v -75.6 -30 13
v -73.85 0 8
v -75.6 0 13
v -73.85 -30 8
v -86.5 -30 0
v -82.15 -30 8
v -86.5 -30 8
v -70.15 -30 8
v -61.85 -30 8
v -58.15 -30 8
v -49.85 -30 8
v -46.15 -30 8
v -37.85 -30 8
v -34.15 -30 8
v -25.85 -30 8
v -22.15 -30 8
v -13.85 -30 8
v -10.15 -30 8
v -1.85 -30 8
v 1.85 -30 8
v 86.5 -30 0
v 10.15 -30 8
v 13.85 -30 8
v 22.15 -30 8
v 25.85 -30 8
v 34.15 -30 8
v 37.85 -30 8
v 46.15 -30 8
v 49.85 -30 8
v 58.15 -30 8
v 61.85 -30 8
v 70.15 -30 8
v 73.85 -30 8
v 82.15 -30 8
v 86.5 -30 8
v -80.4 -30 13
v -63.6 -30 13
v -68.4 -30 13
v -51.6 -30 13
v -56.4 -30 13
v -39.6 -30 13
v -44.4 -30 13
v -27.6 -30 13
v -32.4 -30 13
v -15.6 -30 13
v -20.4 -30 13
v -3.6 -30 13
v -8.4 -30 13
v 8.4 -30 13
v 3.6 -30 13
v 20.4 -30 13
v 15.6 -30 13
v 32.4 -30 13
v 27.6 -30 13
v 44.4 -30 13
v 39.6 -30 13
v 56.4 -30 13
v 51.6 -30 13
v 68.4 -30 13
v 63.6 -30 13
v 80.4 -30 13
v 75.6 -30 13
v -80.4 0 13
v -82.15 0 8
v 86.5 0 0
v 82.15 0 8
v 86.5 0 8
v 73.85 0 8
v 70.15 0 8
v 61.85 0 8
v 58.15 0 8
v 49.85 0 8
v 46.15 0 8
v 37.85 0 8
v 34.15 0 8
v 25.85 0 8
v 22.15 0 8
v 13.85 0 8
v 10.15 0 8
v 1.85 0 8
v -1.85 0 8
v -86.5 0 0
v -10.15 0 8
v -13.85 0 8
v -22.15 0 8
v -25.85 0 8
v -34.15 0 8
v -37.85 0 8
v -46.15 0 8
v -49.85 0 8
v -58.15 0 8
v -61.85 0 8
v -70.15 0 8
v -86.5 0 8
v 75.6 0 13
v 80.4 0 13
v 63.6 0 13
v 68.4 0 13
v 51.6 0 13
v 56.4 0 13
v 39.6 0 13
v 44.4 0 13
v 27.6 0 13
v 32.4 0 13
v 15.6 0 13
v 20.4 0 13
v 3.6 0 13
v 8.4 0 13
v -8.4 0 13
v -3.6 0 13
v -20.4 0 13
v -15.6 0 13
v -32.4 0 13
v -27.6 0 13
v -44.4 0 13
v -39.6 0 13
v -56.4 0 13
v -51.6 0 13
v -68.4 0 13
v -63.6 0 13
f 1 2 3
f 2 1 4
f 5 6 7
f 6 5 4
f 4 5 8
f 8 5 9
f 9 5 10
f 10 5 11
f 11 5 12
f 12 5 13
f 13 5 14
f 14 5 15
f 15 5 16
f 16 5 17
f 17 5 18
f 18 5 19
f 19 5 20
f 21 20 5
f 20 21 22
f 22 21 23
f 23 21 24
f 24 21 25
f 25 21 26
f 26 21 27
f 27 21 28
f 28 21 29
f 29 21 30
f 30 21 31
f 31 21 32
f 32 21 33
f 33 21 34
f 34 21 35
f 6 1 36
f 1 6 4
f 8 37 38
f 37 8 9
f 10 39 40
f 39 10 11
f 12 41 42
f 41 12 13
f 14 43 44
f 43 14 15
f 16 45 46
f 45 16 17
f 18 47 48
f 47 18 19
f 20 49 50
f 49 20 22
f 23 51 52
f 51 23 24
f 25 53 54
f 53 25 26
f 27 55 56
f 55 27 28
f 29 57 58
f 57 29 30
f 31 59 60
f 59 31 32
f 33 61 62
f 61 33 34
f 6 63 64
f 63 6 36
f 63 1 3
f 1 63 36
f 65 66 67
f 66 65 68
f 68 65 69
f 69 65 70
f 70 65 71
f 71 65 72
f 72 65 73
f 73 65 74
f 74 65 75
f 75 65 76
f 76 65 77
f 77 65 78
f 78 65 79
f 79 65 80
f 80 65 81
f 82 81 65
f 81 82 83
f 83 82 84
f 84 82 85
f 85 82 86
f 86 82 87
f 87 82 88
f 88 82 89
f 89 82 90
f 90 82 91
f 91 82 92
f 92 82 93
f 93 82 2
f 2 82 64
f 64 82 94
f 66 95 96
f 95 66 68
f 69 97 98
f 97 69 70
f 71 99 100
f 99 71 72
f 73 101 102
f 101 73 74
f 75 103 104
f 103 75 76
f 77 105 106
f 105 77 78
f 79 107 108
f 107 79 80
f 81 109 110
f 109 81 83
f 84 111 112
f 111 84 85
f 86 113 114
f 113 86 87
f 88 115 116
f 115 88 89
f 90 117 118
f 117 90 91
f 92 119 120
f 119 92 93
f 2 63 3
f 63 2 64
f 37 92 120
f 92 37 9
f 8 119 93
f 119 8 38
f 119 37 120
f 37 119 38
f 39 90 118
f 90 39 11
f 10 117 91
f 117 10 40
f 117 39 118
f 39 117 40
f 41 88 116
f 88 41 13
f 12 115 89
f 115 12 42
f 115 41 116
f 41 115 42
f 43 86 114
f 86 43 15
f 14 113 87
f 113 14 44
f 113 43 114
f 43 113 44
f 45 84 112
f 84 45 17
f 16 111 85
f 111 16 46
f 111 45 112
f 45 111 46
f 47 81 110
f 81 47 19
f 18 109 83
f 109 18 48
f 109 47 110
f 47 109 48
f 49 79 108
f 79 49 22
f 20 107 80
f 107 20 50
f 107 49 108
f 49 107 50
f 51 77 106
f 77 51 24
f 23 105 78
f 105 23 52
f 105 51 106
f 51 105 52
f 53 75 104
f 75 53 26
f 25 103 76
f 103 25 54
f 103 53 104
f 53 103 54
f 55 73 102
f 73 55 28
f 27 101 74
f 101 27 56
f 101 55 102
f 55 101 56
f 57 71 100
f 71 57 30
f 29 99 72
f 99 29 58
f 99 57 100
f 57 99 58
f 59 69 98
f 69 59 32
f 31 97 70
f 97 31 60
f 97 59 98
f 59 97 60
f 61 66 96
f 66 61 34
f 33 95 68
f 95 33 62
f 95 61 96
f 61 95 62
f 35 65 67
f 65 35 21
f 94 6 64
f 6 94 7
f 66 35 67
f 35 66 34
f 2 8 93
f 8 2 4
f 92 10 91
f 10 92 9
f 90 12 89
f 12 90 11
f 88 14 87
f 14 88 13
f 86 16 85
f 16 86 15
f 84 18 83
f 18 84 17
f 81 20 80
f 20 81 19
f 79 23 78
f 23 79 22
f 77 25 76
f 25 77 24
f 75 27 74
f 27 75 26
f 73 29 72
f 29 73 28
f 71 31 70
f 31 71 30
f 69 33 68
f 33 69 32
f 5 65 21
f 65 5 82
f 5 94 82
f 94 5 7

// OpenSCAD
$fn = 32;

// ----------------------------------------------------------------------
// Toothed rack, 14 teeth
// 12 mm pitch, 5 mm teeth
// ----------------------------------------------------------------------

// --- parameters (mm) ---
bar_w = 30;     // bar width (Y)
bar_h = 8;      // bar height (Z)
teeth = 14;     // number of teeth
pitch = 12;     // tooth pitch
tooth_h = 5;    // tooth height above the bar
root_w = 9;     // tooth width at the root
crest_w = 4.8;  // tooth width at the crest

// --- derived feature positions (mm) ---
span = (teeth - 1) * pitch;  // = 156   distance between the outer teeth
bar_l = span + root_w + 8;   // = 173   bar length: teeth plus 4 mm at each end
tooth_x = -span / 2;         // = -78   X of the first tooth
height = bar_h + tooth_h;    // = 13   overall height
feature_centers = [
  [tooth_x + 0 * pitch, -bar_w / 2],
  [tooth_x + 1 * pitch, -bar_w / 2],
  [tooth_x + 2 * pitch, -bar_w / 2],
  [tooth_x + 3 * pitch, -bar_w / 2],
  [tooth_x + 4 * pitch, -bar_w / 2],
  [tooth_x + 5 * pitch, -bar_w / 2],
  [tooth_x + 6 * pitch, -bar_w / 2],
  [tooth_x + 7 * pitch, -bar_w / 2],
  [tooth_x + 8 * pitch, -bar_w / 2],
  [tooth_x + 9 * pitch, -bar_w / 2],
  [tooth_x + 10 * pitch, -bar_w / 2],
  [tooth_x + 11 * pitch, -bar_w / 2],
  [tooth_x + 12 * pitch, -bar_w / 2],
  [tooth_x + 13 * pitch, -bar_w / 2]
];   // tooth centre line, drives the tooth loop

// bar with a rack of teeth, one extruded trapezoium per centre
module rack_tooth() {
  linear_extrude(height = bar_w)
    polygon(points = [
      [0, 0],
      [root_w, 0],
      [root_w / 2 + crest_w / 2, tooth_h + 1],
      [root_w / 2 - crest_w / 2, tooth_h + 1]
    ]);
}

union() {
  translate([-bar_l / 2, -bar_w, 0]) cube([bar_l, bar_w, bar_h]);
  for (centre = feature_centers)
    translate([centre[0] - root_w / 2, 0, bar_h - 1]) rotate([90, 0, 0]) rack_tooth();
}
